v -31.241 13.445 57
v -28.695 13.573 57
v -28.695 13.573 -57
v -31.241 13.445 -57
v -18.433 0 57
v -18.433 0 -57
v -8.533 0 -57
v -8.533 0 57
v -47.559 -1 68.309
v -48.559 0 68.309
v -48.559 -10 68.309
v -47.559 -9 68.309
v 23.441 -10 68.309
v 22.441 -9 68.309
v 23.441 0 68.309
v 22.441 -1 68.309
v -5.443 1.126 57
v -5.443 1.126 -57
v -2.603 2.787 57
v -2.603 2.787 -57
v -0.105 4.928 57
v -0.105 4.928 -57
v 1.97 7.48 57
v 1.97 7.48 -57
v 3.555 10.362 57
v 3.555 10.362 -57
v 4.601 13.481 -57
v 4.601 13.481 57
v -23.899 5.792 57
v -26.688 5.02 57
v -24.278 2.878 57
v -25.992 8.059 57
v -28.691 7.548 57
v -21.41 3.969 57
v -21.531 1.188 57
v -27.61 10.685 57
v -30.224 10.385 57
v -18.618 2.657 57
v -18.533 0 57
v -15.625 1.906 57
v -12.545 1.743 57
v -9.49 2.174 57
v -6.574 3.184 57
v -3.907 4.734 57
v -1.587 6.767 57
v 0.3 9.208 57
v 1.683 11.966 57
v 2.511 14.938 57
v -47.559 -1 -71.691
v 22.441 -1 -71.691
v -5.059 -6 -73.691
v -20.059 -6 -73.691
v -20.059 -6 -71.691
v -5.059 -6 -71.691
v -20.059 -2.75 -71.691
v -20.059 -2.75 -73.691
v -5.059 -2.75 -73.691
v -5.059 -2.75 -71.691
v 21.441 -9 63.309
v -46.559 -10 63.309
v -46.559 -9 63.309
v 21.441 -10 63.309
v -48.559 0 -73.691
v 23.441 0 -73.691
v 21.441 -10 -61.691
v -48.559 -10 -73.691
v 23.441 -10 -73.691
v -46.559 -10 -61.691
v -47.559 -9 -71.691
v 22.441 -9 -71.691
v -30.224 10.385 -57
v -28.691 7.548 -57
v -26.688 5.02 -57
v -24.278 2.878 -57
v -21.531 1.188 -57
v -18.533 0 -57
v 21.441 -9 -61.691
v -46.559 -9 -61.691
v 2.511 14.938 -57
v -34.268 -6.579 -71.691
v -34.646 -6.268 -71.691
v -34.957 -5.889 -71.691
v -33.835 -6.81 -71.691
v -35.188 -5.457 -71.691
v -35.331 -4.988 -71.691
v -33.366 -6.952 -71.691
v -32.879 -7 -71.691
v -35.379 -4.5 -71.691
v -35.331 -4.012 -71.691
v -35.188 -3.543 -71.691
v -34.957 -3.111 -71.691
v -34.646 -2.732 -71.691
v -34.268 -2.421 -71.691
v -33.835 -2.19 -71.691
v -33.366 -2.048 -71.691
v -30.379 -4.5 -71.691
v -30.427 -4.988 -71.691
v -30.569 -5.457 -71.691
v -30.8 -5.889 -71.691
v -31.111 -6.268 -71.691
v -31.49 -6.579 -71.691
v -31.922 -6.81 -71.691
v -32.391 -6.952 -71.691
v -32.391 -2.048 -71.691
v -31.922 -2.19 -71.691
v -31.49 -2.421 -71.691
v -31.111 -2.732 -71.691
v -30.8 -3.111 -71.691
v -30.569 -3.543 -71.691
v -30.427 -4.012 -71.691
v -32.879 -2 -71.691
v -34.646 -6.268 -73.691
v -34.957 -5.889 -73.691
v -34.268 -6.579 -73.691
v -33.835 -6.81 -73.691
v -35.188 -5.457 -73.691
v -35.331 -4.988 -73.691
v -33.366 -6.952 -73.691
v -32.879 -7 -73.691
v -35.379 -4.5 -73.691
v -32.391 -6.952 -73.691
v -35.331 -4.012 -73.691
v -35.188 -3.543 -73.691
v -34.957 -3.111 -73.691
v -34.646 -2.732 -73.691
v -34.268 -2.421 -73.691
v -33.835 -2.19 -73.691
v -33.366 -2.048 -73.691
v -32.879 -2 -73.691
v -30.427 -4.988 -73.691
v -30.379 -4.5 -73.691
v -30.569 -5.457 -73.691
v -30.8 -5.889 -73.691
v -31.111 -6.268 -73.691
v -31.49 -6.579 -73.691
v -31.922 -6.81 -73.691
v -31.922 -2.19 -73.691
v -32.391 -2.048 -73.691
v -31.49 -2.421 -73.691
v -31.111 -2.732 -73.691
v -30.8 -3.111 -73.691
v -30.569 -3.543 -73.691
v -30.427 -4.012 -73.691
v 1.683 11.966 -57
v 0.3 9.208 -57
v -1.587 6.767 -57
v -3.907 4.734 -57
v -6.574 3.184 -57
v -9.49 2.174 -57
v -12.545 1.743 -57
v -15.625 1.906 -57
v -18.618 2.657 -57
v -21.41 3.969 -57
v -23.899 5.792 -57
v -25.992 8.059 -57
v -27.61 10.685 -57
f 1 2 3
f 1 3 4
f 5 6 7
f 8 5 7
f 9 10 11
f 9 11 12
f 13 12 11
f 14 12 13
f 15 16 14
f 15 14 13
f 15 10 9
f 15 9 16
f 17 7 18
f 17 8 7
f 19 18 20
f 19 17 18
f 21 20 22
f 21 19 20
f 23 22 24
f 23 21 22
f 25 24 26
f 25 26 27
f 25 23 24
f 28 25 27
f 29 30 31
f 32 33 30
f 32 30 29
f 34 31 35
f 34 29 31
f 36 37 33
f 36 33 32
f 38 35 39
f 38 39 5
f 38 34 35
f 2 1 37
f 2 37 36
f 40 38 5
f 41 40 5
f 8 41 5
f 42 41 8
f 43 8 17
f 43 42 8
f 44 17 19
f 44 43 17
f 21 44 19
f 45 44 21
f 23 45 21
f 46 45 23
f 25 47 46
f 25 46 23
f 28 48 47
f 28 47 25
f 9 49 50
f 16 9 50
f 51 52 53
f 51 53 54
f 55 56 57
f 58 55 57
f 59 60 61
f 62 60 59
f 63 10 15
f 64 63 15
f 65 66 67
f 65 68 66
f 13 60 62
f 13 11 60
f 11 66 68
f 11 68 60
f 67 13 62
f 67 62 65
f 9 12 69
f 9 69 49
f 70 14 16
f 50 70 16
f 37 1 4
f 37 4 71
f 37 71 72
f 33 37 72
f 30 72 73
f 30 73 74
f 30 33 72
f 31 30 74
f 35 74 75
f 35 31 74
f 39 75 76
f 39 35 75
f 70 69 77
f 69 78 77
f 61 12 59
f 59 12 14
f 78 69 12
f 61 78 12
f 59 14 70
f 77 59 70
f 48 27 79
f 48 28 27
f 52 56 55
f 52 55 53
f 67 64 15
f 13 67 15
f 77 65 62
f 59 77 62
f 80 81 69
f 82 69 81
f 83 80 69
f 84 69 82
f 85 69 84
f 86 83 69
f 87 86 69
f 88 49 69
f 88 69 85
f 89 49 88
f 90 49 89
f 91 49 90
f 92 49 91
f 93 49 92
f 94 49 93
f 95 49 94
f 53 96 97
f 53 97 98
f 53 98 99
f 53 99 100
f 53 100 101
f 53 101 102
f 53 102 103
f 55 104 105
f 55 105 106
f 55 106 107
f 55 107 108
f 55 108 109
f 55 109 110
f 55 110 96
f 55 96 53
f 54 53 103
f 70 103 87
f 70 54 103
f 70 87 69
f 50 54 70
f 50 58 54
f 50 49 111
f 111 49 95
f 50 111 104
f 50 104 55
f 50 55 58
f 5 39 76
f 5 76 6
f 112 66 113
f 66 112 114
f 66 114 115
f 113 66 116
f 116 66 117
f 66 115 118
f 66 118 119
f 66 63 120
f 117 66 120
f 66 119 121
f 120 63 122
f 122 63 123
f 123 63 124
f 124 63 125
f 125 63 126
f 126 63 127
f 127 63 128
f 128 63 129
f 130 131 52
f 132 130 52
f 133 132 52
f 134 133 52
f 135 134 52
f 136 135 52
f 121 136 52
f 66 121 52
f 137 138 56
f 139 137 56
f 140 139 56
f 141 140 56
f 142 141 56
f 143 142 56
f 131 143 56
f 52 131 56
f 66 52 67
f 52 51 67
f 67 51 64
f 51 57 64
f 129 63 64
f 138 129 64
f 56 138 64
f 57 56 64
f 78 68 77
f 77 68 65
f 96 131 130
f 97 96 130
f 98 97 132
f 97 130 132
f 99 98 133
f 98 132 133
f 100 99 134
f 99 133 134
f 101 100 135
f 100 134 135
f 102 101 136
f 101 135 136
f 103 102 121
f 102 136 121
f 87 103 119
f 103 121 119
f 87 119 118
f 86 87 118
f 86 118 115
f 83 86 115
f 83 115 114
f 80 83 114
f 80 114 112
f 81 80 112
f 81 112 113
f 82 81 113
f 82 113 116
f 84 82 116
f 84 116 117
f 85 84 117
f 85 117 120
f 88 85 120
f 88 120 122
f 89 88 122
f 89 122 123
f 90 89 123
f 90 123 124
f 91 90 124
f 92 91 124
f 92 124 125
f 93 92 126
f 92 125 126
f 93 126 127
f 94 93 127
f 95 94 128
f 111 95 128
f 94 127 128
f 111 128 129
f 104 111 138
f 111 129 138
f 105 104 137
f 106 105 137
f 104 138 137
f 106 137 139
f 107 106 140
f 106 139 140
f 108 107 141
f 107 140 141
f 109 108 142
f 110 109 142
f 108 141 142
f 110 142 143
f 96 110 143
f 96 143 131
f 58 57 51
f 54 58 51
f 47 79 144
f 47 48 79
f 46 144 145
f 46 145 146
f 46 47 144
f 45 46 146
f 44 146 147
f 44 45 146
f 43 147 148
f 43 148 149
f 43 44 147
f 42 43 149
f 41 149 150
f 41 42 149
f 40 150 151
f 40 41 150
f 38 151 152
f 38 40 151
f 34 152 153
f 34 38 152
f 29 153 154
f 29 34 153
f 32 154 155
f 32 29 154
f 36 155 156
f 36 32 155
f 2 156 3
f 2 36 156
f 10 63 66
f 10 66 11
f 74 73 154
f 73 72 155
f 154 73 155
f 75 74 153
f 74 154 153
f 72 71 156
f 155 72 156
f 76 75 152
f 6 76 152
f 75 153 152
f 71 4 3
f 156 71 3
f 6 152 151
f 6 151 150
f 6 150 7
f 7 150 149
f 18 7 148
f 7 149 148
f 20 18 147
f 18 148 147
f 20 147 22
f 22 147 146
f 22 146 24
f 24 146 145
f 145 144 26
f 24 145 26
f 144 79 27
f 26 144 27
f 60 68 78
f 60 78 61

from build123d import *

# Parameters (mm, degrees)
F0_W     = 72
F0_H     = 142
F1_DEPTH = 10
F2_W     = 70
F2_H     = 8
F3_DEPTH = 140
F4_W     = 68
F4_H     = 125
F5_DEPTH = 4
F6_W     = 15
F6_H     = 3.25
F6_R     = 2.5
F7_DEPTH = 5
F9_DEPTH = 57


# Not quite as in the source:
# - ends of sketch curves that miss each other by under 0.0002 mm in the source are joined


with BuildPart() as f1:
    # F0 (on Front) → F1 (new body)
    with BuildSketch(Plane.XZ):
        with Locations((-12.5587194562, -2.6913457513)):
            Rectangle(F0_W, F0_H)
    extrude(amount=F1_DEPTH)

    # F2 (on face) → F3 (cut)
    with BuildSketch(Plane.XY.offset(68.3086542487)):
        with Locations((-12.5587194562, -5)):
            Rectangle(F2_W, F2_H)
    extrude(amount=-F3_DEPTH, mode=Mode.SUBTRACT)

    # F4 (on face) → F5 (cut)
    with BuildSketch(Plane.XZ.offset(10)):
        with Locations((-12.5587194562, 0.8086542487)):
            Rectangle(F4_W, F4_H)
    extrude(amount=-F5_DEPTH, mode=Mode.SUBTRACT)

    # F6 (on face) → F7 (cut)
    with BuildSketch(Plane(origin=(0, 0, -73.6913457513), x_dir=(1, 0, 0), z_dir=(0, 0, -1))):
        with Locations((-12.5587194562, 4.375)):
            Rectangle(F6_W, F6_H)
        with Locations((-32.8787194562, 4.5)):
            Circle(F6_R)
    extrude(amount=-F7_DEPTH, mode=Mode.SUBTRACT)


with BuildPart() as f9:
    # F8 (on Top) → F9 (new body, symmetric)
    with BuildSketch(Plane.XY):
        with BuildLine():
            ThreePointArc((7.7113736967, 14.9379451755), (-7.3445934288, 1.7428756888), (-23.4948524625, 13.5733929211))
            Line((-23.4948524625, 13.5733929211), (-26.0410183017, 13.4449196816))
            ThreePointArc((-26.0410183017, 13.4449196816), (-21.4884748179, 5.0199592107), (-13.3333762735, 1.1589e-06))
            Line((-13.3333762735, 1.1589e-06), (-13.2333813235, 1.1589e-06))
            Line((-13.2333813235, 1.1589e-06), (-3.3333762735, 0))
            ThreePointArc((-3.3333762735, 0), (5.0947085652, 4.9276153802), (9.8008521931, 13.4813408573))
            Line((9.8008521931, 13.4813408573), (7.7113736967, 14.9379451755))
        make_face()
    extrude(amount=F9_DEPTH, both=True)


with BuildPart() as f9_1:
    # F10: moved
    add(f9.part.moved(Location((-5.2, 0, 0))))


solid = Compound([f1.part, f9_1.part])
